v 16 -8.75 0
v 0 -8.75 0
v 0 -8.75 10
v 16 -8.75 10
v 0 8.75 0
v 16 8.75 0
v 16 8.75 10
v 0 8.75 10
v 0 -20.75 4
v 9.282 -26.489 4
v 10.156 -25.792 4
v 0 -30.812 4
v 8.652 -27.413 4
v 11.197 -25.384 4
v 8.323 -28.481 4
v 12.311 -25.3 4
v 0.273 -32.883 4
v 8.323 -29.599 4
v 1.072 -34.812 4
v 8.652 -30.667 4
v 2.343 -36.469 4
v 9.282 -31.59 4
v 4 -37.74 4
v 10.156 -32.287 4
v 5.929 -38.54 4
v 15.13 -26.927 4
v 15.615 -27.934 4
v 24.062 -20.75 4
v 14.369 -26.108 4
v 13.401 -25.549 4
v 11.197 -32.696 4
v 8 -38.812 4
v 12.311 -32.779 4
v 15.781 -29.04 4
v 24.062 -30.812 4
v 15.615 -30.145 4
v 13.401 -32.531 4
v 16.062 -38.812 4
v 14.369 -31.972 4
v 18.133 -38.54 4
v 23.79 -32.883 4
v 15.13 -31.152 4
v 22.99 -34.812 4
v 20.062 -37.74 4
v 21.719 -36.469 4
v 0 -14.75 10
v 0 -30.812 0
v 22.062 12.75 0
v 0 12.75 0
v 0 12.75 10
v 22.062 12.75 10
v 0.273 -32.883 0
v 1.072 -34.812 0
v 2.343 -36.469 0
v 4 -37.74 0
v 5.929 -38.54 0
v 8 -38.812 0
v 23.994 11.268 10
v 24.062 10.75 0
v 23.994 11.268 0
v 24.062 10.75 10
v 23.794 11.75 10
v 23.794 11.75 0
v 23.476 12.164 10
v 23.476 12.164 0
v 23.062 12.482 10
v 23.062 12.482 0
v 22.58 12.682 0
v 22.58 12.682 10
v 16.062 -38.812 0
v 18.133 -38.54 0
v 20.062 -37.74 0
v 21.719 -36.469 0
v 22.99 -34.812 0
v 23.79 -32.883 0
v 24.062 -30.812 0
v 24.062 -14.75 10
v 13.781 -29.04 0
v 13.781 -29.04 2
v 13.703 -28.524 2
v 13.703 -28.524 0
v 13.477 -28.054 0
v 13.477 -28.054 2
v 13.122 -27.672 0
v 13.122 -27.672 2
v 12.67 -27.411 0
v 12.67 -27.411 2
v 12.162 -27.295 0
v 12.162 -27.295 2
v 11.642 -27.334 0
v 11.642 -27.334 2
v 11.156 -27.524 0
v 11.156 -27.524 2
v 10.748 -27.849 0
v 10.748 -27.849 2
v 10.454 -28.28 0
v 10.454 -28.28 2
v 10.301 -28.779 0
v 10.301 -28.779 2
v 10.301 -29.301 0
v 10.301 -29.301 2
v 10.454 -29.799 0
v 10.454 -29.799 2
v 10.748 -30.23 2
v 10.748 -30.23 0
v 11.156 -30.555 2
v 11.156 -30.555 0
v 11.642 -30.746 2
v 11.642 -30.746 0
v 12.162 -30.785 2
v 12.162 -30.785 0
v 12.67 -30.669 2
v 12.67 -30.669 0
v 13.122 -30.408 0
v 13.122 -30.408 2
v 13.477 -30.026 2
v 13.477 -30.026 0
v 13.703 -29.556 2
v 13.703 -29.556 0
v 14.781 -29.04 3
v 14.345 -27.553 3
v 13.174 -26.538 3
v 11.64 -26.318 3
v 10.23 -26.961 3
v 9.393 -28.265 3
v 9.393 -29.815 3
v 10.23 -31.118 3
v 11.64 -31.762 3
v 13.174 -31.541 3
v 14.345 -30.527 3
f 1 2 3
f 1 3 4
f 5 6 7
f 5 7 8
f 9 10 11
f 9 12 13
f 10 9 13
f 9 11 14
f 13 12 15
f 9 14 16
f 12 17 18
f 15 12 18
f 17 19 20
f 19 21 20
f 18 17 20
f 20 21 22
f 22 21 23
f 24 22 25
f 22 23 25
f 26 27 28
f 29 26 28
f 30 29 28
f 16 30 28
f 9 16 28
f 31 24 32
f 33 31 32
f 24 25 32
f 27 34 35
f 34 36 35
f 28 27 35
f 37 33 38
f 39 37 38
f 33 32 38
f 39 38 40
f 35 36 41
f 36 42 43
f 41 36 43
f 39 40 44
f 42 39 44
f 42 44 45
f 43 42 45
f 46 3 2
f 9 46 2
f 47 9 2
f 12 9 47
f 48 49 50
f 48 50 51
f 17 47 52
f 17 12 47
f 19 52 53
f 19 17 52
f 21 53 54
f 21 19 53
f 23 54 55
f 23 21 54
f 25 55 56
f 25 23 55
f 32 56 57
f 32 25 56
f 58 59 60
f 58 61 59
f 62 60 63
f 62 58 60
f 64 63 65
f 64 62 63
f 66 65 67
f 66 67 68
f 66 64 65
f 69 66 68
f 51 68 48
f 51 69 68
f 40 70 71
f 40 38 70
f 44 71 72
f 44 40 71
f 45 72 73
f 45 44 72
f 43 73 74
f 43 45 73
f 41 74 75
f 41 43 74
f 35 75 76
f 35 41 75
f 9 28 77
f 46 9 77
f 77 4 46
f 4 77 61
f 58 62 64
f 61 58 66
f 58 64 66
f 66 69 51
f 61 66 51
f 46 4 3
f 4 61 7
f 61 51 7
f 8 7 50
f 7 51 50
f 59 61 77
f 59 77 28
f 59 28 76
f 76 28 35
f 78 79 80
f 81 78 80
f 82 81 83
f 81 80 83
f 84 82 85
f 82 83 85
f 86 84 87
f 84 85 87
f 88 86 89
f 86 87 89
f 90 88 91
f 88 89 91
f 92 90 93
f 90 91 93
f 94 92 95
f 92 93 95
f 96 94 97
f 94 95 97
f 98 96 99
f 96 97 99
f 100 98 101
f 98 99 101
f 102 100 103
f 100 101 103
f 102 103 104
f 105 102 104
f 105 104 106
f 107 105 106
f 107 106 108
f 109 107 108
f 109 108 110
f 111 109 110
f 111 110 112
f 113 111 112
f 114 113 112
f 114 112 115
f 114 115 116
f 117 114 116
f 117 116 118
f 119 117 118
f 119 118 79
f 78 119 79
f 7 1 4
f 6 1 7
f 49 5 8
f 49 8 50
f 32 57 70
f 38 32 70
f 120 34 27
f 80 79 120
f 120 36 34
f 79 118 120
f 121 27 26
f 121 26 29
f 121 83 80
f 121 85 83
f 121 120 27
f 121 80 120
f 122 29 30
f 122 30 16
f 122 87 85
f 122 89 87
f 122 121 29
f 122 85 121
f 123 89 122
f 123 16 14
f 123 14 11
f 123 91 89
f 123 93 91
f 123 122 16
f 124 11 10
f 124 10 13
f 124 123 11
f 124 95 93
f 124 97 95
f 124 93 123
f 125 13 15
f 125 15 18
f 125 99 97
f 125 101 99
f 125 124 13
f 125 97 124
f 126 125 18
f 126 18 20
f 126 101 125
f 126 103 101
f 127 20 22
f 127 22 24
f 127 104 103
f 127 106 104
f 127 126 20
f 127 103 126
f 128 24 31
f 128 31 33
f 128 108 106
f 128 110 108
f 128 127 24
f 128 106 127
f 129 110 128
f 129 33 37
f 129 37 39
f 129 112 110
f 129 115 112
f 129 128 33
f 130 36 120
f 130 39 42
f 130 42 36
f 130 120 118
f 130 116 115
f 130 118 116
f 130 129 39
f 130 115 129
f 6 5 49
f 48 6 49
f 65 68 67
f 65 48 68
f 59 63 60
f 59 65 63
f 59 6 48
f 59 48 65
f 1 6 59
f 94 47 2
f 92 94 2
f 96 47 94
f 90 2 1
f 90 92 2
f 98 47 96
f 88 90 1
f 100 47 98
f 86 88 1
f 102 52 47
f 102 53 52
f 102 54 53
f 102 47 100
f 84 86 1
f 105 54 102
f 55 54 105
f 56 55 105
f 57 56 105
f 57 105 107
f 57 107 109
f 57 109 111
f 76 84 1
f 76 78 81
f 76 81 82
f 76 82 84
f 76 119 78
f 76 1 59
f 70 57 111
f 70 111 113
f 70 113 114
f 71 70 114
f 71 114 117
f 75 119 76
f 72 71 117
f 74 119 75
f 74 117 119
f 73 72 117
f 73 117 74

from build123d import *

# Parameters (mm, degrees)
PAD_DEPTH    = 10
SKETCH001_W  = 24.062258
SKETCH001_H  = 24.062258
PAD001_DEPTH = 4
SKETCH002_R  = 1.75
POCKET_DEPTH = 4.001
CHAMFER_SIZE = 2
FILLET_R     = 8
FILLET001_R  = 2
PAD002_DEPTH = 24.062258


with BuildPart() as part:
    # Sketch → Pad (new body)
    with BuildSketch(Plane.XY):
        Polygon((0, 8.75), (0, 12.75), (24.062258, 12.75), (24.062258, -14.75), (0, -14.75), (0, -8.75), (16, -8.75), (16, 8.75), align=None)
    extrude(amount=PAD_DEPTH)

    # Sketch001 (on Face9 of Pad) → Pad001 (join)
    with BuildSketch(Plane(origin=(0, 0, 0), x_dir=(1, 0, 0), z_dir=(0, 0, -1))):
        with Locations((12.031129, 26.781129)):
            Rectangle(SKETCH001_W, SKETCH001_H)
    extrude(amount=-PAD001_DEPTH)

    # Sketch002 (on Face15 of Pad001) → Pocket (cut, through all)
    with BuildSketch(Plane.XY.offset(4)):
        with Locations((12.031129, -29.039748)):
            Circle(SKETCH002_R)
    extrude(amount=-POCKET_DEPTH, mode=Mode.SUBTRACT)

    # Chamfer
    chamfer_edges = [part.edges().sort_by_distance(p)[0] for p in [
        (10.281129, -29.039748, 4),
    ]]
    chamfer(chamfer_edges, length=CHAMFER_SIZE)

    # Fillet
    fillet_edges = [part.edges().sort_by_distance(p)[0] for p in [
        (0, -38.812258, 2),
        (24.062258, -38.812258, 2),
    ]]
    fillet(fillet_edges, radius=FILLET_R)

    # Fillet001
    fillet001_edges = [part.edges().sort_by_distance(p)[0] for p in [
        (24.062258, 12.75, 5),
    ]]
    fillet(fillet001_edges, radius=FILLET001_R)

    # Sketch003 (on Face12 of Fillet001) → Pad002 (join)
    with BuildSketch(Plane.YZ.offset(24.062258)):
        Polygon((-20.75, 4), (-14.75, 10), (-14.75, 4), align=None)
    extrude(amount=-PAD002_DEPTH)


solid = part.part
